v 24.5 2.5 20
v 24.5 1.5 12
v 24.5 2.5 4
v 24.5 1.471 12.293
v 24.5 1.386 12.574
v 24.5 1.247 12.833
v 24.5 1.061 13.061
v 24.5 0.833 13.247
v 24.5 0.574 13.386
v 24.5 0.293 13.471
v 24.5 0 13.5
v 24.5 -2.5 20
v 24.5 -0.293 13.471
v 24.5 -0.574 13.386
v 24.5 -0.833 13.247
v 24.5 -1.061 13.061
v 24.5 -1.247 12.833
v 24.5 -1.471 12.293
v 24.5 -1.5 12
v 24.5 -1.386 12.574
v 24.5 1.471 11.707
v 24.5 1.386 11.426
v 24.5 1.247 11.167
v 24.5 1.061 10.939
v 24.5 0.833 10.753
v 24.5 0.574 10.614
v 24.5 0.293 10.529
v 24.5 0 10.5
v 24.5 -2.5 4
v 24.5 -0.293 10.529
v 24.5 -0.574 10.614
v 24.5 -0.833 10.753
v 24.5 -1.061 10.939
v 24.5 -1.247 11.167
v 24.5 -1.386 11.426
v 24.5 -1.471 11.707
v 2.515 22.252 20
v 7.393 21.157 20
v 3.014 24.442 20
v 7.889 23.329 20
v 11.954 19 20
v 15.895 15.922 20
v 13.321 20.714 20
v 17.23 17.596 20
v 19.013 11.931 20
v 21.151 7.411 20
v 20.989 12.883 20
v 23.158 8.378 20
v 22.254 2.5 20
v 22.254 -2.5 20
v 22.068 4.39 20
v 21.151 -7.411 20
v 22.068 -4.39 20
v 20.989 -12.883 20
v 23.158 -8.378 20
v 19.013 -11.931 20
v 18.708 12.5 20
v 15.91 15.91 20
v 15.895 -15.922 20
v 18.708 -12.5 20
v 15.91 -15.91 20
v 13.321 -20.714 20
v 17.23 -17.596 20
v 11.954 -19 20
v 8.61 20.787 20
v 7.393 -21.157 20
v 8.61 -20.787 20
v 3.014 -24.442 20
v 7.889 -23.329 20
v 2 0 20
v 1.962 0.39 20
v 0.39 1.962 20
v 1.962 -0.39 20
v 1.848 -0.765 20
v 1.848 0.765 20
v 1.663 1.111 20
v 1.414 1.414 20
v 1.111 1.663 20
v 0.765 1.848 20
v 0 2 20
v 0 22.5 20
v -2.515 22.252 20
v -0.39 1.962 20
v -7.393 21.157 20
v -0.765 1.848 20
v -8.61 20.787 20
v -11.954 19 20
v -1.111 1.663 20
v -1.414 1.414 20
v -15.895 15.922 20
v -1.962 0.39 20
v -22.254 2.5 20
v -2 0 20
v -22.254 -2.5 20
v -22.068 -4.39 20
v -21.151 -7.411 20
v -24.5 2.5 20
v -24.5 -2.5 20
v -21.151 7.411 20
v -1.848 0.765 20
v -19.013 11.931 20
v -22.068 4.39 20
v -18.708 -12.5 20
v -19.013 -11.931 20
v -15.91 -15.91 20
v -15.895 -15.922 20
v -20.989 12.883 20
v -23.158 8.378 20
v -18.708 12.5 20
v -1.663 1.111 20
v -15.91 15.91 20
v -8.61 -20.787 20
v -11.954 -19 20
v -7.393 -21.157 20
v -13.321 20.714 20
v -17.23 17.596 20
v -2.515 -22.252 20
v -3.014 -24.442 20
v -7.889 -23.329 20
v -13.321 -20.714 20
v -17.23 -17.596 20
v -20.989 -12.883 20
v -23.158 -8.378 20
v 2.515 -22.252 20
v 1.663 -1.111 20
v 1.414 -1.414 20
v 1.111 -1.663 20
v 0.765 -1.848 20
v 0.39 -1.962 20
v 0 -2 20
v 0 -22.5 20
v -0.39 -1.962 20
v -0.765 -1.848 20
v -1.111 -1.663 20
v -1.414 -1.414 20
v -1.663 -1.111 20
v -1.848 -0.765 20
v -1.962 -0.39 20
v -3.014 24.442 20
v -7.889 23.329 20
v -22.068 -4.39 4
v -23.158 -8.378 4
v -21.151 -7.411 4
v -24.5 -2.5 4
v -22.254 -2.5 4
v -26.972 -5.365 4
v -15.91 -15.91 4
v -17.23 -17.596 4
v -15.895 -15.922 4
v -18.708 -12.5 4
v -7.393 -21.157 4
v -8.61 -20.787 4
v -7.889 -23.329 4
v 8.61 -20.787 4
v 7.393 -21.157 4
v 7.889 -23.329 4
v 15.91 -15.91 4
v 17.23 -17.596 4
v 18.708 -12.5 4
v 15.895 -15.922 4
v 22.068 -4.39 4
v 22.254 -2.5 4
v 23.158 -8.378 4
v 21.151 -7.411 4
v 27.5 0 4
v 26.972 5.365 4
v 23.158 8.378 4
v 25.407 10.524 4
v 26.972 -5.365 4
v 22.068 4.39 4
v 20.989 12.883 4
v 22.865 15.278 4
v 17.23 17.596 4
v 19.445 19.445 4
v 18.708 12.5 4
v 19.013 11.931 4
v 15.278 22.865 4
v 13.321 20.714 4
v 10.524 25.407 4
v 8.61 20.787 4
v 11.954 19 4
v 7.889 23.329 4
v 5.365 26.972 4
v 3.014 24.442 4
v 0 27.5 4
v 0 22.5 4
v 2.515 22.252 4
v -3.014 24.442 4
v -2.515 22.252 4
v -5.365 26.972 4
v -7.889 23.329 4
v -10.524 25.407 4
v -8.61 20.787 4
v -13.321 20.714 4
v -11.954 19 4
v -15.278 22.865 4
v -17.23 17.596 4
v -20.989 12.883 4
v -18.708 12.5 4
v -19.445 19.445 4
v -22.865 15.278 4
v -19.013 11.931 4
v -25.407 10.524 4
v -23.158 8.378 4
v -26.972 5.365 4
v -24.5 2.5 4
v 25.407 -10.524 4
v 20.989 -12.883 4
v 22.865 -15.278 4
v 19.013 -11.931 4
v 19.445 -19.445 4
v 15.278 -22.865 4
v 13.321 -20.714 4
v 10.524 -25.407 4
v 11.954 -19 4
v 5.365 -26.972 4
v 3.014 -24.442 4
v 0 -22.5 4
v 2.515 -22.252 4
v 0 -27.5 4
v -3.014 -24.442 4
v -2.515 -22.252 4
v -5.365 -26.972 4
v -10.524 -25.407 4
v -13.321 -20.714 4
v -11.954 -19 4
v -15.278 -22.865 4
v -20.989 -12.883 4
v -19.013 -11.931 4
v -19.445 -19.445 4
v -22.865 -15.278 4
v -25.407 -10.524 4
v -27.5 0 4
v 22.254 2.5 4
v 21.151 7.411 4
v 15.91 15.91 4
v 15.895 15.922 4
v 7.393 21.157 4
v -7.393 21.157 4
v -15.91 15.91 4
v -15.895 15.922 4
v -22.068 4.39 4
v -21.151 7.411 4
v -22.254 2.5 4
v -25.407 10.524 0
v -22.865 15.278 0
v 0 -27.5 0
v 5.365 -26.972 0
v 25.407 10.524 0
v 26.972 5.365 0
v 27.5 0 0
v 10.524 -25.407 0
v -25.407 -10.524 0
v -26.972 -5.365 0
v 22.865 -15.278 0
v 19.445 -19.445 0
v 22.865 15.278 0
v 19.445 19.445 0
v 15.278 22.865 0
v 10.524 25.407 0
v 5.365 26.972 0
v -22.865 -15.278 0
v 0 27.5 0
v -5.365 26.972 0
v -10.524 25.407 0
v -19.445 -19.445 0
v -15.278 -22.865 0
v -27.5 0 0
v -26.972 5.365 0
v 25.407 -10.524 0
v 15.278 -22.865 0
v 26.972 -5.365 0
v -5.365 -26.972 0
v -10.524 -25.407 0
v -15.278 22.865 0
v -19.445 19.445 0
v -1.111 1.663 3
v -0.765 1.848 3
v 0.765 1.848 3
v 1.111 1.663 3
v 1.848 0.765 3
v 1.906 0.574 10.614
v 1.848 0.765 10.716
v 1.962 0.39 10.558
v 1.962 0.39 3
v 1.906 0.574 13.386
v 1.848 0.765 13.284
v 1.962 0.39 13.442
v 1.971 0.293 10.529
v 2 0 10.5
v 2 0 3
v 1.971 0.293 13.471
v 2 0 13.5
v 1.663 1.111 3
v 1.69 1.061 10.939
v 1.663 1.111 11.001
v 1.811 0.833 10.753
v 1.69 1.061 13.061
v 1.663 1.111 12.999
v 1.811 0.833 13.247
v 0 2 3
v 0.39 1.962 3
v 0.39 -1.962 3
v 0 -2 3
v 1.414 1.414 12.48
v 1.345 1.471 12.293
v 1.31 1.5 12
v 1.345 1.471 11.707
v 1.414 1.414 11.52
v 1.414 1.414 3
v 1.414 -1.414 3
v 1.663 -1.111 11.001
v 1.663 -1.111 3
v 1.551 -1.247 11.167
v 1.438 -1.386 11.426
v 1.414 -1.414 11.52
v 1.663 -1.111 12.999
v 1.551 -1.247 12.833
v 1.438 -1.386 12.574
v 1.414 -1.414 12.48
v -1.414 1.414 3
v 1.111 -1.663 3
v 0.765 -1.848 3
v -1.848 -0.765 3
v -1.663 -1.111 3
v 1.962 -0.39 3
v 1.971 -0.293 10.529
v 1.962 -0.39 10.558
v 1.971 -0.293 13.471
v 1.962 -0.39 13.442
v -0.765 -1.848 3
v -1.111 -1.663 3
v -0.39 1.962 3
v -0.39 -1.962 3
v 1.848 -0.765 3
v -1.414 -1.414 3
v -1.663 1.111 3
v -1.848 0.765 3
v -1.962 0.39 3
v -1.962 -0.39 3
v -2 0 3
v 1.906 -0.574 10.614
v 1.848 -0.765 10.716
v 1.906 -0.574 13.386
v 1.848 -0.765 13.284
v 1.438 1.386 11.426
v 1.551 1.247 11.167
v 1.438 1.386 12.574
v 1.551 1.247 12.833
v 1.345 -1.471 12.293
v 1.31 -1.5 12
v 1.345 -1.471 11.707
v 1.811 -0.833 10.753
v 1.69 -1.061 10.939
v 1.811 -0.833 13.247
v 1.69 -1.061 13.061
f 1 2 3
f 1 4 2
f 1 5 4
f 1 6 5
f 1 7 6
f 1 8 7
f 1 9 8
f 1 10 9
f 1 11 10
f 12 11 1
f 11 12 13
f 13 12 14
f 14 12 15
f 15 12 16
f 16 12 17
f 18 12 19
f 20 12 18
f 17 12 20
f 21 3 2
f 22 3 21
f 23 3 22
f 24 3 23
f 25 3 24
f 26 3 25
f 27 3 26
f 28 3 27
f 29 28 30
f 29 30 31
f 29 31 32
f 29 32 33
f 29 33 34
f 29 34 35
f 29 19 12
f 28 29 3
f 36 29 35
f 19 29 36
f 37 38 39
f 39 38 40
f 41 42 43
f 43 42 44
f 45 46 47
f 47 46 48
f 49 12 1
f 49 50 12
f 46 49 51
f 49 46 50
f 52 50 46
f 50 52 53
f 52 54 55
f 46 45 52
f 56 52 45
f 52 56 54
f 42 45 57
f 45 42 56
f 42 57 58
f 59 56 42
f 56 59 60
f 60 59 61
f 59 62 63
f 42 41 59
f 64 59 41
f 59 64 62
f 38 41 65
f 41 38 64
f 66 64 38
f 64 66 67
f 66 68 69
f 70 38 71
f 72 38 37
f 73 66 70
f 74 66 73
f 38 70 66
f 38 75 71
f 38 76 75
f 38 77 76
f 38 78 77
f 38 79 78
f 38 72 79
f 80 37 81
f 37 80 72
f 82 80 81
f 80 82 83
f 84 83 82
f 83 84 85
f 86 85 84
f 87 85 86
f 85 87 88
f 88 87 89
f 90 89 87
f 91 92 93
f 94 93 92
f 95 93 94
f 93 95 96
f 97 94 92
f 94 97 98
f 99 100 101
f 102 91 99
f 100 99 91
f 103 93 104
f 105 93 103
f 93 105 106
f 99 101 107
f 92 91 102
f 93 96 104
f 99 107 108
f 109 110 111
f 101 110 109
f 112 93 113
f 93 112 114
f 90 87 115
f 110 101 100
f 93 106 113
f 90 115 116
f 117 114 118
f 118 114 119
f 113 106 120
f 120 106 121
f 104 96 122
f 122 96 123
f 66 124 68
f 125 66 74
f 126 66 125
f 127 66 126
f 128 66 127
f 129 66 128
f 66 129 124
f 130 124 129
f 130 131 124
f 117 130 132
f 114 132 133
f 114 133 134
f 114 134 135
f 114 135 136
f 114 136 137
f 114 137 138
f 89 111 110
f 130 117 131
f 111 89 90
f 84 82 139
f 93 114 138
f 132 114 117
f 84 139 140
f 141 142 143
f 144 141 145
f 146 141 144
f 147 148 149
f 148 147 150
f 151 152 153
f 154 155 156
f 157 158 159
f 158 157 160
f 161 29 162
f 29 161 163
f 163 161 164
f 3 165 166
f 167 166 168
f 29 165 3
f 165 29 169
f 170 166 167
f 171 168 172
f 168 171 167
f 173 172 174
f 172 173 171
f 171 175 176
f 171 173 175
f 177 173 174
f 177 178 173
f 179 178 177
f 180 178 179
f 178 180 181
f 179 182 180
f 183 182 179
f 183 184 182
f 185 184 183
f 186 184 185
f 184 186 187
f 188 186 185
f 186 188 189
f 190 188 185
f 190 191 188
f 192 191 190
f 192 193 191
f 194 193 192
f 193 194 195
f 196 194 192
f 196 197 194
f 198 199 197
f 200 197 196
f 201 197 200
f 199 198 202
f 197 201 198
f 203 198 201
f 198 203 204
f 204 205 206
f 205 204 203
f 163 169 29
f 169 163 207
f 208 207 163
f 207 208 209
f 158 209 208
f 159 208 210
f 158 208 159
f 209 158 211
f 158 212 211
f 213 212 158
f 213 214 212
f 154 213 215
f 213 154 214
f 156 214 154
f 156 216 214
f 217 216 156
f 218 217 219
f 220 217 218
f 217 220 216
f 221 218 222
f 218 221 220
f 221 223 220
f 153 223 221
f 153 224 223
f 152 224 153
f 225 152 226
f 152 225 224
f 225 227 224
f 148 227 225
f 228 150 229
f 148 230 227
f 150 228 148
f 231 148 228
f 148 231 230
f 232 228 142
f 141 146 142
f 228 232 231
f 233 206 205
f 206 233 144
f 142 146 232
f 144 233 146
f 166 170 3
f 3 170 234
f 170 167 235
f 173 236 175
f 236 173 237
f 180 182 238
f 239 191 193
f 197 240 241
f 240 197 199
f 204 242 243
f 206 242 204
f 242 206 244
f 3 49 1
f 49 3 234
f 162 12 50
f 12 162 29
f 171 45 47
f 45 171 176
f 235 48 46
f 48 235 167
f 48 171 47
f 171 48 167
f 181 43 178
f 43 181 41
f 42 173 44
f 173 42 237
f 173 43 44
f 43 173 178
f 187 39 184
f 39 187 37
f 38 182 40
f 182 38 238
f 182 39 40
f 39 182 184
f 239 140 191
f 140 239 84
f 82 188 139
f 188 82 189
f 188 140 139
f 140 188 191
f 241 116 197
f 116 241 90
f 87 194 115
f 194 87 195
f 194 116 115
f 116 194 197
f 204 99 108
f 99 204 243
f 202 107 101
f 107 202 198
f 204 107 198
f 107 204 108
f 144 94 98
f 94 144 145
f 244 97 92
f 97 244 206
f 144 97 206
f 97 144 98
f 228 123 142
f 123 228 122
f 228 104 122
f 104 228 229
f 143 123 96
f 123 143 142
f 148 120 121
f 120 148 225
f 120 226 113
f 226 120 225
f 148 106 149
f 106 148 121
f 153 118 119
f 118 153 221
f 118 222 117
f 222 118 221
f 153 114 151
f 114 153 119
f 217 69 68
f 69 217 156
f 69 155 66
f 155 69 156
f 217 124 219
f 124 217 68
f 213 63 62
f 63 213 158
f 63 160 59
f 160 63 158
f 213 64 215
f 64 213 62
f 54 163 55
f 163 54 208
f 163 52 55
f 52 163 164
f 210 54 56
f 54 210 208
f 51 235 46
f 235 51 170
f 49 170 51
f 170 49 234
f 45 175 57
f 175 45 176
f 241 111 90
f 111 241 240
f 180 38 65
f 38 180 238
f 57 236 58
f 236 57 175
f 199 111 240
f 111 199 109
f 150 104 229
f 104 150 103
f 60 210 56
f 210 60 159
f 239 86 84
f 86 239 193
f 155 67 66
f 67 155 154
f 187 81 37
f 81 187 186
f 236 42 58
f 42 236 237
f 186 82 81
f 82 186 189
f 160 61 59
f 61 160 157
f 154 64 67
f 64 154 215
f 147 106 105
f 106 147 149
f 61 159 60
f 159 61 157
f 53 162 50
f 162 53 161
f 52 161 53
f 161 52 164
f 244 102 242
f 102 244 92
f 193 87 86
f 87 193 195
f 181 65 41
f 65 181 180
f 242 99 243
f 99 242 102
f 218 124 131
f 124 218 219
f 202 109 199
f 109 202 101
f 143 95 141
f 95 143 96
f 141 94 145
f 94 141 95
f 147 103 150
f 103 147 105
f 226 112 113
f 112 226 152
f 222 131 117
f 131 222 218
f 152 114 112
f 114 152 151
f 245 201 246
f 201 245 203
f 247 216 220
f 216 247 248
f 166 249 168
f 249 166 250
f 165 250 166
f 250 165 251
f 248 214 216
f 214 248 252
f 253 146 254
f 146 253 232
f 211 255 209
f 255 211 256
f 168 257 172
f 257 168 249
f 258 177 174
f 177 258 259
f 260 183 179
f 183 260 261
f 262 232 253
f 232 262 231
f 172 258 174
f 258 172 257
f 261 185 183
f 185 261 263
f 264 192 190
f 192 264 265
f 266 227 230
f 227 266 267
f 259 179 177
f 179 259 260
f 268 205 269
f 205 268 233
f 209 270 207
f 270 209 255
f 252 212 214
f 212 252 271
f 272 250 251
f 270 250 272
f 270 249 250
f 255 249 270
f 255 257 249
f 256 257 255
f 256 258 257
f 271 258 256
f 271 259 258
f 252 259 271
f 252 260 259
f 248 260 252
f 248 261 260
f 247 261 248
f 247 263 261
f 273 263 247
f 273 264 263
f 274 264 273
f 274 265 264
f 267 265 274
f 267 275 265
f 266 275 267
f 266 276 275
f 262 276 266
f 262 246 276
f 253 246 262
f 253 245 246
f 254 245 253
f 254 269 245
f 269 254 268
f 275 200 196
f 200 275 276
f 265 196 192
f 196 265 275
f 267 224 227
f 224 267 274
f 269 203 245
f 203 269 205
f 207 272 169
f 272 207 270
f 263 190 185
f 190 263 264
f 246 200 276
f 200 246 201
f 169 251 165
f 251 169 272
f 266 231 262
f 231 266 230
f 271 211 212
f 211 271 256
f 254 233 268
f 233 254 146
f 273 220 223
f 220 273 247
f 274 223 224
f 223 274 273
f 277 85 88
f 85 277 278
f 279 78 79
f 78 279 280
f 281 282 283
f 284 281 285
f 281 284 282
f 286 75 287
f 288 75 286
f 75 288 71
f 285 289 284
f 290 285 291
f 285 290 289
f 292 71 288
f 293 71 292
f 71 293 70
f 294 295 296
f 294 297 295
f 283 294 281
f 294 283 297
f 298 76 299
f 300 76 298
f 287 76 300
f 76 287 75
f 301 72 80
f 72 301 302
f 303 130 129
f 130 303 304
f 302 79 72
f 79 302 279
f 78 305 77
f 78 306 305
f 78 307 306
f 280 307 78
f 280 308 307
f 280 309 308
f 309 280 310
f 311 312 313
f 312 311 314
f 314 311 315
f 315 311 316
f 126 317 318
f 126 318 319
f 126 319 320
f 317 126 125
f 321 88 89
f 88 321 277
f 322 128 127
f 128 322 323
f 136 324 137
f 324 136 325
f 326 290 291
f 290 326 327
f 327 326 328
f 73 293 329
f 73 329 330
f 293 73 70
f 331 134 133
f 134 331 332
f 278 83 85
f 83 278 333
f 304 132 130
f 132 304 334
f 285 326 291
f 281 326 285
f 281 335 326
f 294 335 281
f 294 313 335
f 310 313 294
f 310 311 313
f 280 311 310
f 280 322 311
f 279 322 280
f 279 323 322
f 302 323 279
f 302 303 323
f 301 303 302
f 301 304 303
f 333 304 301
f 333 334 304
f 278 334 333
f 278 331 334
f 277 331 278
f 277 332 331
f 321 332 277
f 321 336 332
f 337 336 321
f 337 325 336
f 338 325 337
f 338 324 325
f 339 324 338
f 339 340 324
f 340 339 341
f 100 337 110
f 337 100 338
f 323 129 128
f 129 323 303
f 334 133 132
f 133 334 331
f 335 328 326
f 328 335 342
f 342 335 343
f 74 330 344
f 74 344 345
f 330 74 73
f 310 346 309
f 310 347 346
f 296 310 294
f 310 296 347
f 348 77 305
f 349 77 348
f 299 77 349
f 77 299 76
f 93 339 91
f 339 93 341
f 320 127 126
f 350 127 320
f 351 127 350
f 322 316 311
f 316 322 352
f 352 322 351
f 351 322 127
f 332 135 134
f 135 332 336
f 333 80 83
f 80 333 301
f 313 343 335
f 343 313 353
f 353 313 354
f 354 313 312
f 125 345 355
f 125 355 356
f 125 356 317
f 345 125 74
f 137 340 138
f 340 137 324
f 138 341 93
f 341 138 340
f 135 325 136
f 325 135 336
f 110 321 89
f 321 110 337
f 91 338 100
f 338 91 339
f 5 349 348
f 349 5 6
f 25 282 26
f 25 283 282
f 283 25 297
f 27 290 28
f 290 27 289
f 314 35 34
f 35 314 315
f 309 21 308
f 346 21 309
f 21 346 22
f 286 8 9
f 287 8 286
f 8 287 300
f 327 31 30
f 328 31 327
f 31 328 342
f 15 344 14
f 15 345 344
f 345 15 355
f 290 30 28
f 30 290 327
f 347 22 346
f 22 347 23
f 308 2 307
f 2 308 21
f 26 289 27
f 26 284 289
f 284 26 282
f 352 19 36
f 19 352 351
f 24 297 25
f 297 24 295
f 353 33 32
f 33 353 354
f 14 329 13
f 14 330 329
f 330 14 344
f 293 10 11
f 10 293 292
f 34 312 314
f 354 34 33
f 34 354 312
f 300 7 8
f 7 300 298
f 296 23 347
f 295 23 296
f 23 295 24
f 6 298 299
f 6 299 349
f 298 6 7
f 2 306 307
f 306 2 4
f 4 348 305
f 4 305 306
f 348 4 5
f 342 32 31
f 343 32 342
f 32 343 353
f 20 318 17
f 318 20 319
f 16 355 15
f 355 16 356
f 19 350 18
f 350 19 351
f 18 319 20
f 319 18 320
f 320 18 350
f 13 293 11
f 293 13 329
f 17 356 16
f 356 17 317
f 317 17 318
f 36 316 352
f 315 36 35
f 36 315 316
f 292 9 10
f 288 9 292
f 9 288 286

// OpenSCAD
$fn = 32;

// ----------------------------------------------------------------------
// Control knob: skirt knob with grip ribs
// ----------------------------------------------------------------------

// --- parameters (mm) ---
skirt_d = 55;             // skirt diameter
skirt_t = 4;              // skirt thickness
rib_w = 5;                // grip rib width
rib_out = 3;              // grip rib radial protrusion
n_ribs = 14;              // number of grip ribs
knob_d = 45;              // knob body diameter
knob_h = 16;              // knob body height
bore_d = 4;               // shaft bore diameter
set_d = 3;                // set screw bore diameter

rib_step = 360 / n_ribs;  // rib angular step
total_h = skirt_t + knob_h;  // overall height

difference() {
  union() {
    translate([0, 0, skirt_t]) cylinder(h = knob_h, d = knob_d);
    cylinder(h = skirt_t, d = skirt_d);
    for (i = [0 : n_ribs - 1])
      rotate([0, 0, i * rib_step])
        translate([knob_d / 2 - 1, -rib_w / 2, skirt_t])
          cube([rib_out, rib_w, knob_h]);
  }
  translate([0, 0, skirt_t - 1]) cylinder(h = knob_h + 2, d = bore_d);
  translate([-1, 0, skirt_t + knob_h / 2]) rotate([0, 90, 0])
    cylinder(h = knob_d / 2 + bore_d / 2 + 2, d = set_d);
}
